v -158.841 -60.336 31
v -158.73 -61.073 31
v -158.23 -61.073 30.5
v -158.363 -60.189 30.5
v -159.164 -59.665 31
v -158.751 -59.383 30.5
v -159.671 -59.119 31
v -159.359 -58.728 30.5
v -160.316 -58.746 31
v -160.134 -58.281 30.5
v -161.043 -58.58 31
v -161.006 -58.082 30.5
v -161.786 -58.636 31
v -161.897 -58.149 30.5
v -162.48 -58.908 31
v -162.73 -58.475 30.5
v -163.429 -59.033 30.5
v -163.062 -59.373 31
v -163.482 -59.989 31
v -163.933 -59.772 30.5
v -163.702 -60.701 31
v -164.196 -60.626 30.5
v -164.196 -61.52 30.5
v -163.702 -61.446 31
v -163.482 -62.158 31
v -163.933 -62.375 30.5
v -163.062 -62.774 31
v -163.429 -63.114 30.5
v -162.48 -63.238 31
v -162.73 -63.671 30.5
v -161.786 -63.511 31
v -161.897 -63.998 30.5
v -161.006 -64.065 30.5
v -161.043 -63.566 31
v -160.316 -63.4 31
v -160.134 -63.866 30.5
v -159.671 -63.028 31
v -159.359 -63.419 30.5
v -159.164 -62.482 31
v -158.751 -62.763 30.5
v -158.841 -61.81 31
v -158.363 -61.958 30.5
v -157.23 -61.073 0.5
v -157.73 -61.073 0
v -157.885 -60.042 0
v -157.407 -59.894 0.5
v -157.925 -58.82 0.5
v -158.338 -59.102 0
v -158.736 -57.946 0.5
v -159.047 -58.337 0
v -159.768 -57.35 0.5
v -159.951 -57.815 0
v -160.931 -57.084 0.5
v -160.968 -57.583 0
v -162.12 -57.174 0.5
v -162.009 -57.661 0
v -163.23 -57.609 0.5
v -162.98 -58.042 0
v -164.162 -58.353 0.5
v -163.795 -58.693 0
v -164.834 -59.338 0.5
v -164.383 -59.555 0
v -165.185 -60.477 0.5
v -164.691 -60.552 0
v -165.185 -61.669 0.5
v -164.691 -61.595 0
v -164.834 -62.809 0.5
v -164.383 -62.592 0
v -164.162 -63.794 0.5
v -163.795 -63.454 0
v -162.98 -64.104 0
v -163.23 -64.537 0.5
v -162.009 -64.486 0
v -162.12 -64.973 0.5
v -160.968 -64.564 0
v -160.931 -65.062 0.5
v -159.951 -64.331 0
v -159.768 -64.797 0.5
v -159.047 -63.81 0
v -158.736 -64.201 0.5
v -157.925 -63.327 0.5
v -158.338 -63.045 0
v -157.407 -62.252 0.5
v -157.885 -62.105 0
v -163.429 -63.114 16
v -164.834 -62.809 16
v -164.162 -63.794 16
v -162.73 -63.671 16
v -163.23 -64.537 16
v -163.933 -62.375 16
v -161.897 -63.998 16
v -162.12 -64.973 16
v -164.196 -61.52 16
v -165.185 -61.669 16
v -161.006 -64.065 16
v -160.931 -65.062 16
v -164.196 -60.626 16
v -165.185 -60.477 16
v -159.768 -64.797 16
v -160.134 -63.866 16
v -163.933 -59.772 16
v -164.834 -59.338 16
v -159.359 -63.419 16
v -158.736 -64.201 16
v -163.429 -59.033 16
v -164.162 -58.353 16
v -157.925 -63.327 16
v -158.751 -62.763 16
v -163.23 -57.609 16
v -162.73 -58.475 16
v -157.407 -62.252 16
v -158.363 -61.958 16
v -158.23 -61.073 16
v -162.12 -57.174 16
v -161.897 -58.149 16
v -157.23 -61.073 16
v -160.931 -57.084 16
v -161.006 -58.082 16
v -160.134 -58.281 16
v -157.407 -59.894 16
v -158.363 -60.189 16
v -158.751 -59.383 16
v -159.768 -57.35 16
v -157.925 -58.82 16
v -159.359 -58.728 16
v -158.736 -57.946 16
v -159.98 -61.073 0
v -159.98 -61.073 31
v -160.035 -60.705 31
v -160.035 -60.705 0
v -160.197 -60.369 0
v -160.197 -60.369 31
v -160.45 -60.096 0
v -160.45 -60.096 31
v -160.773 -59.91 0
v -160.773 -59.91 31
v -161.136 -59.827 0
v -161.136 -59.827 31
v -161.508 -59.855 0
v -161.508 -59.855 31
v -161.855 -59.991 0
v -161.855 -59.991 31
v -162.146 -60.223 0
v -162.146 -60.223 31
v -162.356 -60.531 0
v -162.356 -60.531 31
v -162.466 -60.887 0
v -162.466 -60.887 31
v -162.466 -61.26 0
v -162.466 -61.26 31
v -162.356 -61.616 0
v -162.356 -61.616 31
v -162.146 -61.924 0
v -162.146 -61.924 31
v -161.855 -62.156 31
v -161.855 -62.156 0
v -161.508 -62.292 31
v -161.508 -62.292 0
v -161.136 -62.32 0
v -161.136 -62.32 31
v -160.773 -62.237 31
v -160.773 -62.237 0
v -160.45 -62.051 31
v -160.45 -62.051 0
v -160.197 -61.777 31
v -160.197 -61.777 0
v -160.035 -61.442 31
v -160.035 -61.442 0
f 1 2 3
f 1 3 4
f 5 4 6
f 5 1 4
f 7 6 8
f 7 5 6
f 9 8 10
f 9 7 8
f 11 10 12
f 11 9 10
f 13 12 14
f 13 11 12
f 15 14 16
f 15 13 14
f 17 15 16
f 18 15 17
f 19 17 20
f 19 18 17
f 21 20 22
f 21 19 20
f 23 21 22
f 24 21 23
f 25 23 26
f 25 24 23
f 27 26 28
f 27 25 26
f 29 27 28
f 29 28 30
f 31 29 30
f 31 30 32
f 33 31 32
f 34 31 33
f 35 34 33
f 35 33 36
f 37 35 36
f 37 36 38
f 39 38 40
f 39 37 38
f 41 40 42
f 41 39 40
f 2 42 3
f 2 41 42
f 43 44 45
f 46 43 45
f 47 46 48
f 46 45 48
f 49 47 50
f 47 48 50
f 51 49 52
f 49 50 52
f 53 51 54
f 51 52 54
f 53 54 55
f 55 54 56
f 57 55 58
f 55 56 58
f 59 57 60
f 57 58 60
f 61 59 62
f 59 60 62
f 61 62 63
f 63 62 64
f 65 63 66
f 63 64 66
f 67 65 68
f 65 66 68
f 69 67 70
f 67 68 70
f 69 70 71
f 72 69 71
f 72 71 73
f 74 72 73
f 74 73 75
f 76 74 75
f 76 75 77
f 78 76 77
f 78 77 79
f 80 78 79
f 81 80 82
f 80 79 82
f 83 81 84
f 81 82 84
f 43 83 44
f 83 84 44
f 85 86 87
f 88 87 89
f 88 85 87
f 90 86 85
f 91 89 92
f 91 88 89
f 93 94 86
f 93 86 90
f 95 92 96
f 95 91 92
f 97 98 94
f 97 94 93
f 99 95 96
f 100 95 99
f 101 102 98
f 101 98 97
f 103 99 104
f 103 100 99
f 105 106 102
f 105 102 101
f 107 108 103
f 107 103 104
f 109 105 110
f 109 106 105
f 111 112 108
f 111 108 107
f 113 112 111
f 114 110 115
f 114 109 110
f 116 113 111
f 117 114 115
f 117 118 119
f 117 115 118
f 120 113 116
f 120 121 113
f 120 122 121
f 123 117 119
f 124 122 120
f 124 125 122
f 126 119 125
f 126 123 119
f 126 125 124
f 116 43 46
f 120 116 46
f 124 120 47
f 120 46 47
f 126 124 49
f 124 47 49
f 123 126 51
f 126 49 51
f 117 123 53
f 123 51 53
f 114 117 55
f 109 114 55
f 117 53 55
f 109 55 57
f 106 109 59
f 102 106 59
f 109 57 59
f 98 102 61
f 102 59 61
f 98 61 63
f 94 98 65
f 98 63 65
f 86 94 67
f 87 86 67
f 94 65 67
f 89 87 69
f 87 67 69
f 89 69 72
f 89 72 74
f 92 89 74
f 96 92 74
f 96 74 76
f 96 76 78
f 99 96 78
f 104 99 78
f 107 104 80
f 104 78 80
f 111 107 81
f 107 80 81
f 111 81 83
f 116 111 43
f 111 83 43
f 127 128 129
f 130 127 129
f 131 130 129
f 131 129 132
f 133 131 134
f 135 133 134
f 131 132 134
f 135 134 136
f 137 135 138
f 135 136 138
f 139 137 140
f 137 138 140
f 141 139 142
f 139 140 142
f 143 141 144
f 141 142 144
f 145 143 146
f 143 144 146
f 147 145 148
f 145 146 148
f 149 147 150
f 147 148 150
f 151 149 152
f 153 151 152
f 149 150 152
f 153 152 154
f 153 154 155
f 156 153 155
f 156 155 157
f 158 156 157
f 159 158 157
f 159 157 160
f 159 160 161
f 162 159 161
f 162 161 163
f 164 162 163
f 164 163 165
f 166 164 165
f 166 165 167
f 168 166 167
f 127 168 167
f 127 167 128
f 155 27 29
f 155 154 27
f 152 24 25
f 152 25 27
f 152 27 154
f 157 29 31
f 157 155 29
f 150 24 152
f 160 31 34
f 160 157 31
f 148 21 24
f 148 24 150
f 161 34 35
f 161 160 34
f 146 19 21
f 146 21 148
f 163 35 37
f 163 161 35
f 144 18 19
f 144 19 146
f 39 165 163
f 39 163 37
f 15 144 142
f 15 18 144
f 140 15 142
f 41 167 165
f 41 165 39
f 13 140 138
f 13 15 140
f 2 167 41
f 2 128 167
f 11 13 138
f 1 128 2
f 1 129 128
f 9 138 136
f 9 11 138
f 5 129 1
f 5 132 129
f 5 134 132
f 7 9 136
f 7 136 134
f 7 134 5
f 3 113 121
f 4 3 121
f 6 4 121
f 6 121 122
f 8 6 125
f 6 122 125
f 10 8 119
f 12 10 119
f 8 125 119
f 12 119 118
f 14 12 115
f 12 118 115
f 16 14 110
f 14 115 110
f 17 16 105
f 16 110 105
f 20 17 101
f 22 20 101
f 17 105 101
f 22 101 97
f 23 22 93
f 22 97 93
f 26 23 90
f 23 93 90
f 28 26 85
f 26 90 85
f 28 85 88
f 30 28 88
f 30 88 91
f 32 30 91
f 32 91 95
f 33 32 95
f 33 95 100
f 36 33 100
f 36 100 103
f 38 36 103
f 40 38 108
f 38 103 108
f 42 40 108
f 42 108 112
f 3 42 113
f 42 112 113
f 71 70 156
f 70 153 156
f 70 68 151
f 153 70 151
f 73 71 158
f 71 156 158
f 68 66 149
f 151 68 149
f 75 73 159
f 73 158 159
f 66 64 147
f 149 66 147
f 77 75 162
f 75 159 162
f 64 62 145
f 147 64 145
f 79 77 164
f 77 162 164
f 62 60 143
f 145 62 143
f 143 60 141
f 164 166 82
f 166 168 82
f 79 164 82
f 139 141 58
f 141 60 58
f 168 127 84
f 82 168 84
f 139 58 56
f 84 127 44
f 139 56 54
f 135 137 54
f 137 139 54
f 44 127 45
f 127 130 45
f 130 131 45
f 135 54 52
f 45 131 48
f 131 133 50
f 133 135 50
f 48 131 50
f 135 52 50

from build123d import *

# Parameters (mm, degrees)
SKETCH1_R           = 4
BOSS_EXTRUDE1_DEPTH = 16
SKETCH2_R           = 3
BOSS_EXTRUDE2_DEPTH = 15
SKETCH3_R           = 1.25
CUT_EXTRUDE1_DEPTH  = 40
CHAMFER1_SIZE       = 0.5


with BuildPart() as part:
    # Sketch1 → Boss-Extrude1 (new body)
    with BuildSketch(Plane.XY):
        with Locations((-161.229707574, -61.073300905)):
            Circle(SKETCH1_R)
    extrude(amount=BOSS_EXTRUDE1_DEPTH)

    # Sketch2 → Boss-Extrude2 (add)
    with BuildSketch(Plane.XY.offset(16)):
        with Locations((-161.229707574, -61.073300905)):
            Circle(SKETCH2_R)
    extrude(amount=BOSS_EXTRUDE2_DEPTH)

    # Sketch3 → Cut-Extrude1 (cut)
    with BuildSketch(Plane.XY.offset(31)):
        with Locations((-161.229707574, -61.073300905)):
            Circle(SKETCH3_R)
    extrude(amount=-CUT_EXTRUDE1_DEPTH, mode=Mode.SUBTRACT)

    # Chamfer1
    chamfer1_edges = [part.edges().sort_by_distance(p)[0] for p in [
        (-165.229707574, -61.073300905, 0),
        (-164.229707574, -61.073300905, 31),
    ]]
    chamfer(chamfer1_edges, length=CHAMFER1_SIZE)


solid = part.part
